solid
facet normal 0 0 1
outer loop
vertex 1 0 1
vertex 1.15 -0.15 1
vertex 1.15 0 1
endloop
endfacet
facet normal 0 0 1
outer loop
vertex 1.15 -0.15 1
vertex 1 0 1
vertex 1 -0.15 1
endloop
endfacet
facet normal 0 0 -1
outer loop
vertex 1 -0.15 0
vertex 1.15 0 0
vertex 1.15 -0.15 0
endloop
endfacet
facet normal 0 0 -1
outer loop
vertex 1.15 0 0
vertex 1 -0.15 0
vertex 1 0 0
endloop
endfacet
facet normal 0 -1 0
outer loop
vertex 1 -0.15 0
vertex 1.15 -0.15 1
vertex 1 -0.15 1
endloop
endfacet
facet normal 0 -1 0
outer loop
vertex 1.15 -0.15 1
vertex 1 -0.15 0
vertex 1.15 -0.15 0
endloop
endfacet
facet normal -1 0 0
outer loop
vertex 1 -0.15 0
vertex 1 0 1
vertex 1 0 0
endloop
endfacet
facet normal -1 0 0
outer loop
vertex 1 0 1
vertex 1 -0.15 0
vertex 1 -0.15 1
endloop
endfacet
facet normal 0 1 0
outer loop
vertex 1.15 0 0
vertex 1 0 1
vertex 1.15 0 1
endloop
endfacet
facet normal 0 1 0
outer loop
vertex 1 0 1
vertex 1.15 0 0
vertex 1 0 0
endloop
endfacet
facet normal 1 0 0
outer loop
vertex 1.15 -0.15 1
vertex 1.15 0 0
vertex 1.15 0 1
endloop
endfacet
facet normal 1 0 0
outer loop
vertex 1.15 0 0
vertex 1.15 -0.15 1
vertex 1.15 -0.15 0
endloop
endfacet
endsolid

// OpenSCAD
translate([1.15,-.15,0])
scale([-1,1,1])
cube([.15,.15,1]);
